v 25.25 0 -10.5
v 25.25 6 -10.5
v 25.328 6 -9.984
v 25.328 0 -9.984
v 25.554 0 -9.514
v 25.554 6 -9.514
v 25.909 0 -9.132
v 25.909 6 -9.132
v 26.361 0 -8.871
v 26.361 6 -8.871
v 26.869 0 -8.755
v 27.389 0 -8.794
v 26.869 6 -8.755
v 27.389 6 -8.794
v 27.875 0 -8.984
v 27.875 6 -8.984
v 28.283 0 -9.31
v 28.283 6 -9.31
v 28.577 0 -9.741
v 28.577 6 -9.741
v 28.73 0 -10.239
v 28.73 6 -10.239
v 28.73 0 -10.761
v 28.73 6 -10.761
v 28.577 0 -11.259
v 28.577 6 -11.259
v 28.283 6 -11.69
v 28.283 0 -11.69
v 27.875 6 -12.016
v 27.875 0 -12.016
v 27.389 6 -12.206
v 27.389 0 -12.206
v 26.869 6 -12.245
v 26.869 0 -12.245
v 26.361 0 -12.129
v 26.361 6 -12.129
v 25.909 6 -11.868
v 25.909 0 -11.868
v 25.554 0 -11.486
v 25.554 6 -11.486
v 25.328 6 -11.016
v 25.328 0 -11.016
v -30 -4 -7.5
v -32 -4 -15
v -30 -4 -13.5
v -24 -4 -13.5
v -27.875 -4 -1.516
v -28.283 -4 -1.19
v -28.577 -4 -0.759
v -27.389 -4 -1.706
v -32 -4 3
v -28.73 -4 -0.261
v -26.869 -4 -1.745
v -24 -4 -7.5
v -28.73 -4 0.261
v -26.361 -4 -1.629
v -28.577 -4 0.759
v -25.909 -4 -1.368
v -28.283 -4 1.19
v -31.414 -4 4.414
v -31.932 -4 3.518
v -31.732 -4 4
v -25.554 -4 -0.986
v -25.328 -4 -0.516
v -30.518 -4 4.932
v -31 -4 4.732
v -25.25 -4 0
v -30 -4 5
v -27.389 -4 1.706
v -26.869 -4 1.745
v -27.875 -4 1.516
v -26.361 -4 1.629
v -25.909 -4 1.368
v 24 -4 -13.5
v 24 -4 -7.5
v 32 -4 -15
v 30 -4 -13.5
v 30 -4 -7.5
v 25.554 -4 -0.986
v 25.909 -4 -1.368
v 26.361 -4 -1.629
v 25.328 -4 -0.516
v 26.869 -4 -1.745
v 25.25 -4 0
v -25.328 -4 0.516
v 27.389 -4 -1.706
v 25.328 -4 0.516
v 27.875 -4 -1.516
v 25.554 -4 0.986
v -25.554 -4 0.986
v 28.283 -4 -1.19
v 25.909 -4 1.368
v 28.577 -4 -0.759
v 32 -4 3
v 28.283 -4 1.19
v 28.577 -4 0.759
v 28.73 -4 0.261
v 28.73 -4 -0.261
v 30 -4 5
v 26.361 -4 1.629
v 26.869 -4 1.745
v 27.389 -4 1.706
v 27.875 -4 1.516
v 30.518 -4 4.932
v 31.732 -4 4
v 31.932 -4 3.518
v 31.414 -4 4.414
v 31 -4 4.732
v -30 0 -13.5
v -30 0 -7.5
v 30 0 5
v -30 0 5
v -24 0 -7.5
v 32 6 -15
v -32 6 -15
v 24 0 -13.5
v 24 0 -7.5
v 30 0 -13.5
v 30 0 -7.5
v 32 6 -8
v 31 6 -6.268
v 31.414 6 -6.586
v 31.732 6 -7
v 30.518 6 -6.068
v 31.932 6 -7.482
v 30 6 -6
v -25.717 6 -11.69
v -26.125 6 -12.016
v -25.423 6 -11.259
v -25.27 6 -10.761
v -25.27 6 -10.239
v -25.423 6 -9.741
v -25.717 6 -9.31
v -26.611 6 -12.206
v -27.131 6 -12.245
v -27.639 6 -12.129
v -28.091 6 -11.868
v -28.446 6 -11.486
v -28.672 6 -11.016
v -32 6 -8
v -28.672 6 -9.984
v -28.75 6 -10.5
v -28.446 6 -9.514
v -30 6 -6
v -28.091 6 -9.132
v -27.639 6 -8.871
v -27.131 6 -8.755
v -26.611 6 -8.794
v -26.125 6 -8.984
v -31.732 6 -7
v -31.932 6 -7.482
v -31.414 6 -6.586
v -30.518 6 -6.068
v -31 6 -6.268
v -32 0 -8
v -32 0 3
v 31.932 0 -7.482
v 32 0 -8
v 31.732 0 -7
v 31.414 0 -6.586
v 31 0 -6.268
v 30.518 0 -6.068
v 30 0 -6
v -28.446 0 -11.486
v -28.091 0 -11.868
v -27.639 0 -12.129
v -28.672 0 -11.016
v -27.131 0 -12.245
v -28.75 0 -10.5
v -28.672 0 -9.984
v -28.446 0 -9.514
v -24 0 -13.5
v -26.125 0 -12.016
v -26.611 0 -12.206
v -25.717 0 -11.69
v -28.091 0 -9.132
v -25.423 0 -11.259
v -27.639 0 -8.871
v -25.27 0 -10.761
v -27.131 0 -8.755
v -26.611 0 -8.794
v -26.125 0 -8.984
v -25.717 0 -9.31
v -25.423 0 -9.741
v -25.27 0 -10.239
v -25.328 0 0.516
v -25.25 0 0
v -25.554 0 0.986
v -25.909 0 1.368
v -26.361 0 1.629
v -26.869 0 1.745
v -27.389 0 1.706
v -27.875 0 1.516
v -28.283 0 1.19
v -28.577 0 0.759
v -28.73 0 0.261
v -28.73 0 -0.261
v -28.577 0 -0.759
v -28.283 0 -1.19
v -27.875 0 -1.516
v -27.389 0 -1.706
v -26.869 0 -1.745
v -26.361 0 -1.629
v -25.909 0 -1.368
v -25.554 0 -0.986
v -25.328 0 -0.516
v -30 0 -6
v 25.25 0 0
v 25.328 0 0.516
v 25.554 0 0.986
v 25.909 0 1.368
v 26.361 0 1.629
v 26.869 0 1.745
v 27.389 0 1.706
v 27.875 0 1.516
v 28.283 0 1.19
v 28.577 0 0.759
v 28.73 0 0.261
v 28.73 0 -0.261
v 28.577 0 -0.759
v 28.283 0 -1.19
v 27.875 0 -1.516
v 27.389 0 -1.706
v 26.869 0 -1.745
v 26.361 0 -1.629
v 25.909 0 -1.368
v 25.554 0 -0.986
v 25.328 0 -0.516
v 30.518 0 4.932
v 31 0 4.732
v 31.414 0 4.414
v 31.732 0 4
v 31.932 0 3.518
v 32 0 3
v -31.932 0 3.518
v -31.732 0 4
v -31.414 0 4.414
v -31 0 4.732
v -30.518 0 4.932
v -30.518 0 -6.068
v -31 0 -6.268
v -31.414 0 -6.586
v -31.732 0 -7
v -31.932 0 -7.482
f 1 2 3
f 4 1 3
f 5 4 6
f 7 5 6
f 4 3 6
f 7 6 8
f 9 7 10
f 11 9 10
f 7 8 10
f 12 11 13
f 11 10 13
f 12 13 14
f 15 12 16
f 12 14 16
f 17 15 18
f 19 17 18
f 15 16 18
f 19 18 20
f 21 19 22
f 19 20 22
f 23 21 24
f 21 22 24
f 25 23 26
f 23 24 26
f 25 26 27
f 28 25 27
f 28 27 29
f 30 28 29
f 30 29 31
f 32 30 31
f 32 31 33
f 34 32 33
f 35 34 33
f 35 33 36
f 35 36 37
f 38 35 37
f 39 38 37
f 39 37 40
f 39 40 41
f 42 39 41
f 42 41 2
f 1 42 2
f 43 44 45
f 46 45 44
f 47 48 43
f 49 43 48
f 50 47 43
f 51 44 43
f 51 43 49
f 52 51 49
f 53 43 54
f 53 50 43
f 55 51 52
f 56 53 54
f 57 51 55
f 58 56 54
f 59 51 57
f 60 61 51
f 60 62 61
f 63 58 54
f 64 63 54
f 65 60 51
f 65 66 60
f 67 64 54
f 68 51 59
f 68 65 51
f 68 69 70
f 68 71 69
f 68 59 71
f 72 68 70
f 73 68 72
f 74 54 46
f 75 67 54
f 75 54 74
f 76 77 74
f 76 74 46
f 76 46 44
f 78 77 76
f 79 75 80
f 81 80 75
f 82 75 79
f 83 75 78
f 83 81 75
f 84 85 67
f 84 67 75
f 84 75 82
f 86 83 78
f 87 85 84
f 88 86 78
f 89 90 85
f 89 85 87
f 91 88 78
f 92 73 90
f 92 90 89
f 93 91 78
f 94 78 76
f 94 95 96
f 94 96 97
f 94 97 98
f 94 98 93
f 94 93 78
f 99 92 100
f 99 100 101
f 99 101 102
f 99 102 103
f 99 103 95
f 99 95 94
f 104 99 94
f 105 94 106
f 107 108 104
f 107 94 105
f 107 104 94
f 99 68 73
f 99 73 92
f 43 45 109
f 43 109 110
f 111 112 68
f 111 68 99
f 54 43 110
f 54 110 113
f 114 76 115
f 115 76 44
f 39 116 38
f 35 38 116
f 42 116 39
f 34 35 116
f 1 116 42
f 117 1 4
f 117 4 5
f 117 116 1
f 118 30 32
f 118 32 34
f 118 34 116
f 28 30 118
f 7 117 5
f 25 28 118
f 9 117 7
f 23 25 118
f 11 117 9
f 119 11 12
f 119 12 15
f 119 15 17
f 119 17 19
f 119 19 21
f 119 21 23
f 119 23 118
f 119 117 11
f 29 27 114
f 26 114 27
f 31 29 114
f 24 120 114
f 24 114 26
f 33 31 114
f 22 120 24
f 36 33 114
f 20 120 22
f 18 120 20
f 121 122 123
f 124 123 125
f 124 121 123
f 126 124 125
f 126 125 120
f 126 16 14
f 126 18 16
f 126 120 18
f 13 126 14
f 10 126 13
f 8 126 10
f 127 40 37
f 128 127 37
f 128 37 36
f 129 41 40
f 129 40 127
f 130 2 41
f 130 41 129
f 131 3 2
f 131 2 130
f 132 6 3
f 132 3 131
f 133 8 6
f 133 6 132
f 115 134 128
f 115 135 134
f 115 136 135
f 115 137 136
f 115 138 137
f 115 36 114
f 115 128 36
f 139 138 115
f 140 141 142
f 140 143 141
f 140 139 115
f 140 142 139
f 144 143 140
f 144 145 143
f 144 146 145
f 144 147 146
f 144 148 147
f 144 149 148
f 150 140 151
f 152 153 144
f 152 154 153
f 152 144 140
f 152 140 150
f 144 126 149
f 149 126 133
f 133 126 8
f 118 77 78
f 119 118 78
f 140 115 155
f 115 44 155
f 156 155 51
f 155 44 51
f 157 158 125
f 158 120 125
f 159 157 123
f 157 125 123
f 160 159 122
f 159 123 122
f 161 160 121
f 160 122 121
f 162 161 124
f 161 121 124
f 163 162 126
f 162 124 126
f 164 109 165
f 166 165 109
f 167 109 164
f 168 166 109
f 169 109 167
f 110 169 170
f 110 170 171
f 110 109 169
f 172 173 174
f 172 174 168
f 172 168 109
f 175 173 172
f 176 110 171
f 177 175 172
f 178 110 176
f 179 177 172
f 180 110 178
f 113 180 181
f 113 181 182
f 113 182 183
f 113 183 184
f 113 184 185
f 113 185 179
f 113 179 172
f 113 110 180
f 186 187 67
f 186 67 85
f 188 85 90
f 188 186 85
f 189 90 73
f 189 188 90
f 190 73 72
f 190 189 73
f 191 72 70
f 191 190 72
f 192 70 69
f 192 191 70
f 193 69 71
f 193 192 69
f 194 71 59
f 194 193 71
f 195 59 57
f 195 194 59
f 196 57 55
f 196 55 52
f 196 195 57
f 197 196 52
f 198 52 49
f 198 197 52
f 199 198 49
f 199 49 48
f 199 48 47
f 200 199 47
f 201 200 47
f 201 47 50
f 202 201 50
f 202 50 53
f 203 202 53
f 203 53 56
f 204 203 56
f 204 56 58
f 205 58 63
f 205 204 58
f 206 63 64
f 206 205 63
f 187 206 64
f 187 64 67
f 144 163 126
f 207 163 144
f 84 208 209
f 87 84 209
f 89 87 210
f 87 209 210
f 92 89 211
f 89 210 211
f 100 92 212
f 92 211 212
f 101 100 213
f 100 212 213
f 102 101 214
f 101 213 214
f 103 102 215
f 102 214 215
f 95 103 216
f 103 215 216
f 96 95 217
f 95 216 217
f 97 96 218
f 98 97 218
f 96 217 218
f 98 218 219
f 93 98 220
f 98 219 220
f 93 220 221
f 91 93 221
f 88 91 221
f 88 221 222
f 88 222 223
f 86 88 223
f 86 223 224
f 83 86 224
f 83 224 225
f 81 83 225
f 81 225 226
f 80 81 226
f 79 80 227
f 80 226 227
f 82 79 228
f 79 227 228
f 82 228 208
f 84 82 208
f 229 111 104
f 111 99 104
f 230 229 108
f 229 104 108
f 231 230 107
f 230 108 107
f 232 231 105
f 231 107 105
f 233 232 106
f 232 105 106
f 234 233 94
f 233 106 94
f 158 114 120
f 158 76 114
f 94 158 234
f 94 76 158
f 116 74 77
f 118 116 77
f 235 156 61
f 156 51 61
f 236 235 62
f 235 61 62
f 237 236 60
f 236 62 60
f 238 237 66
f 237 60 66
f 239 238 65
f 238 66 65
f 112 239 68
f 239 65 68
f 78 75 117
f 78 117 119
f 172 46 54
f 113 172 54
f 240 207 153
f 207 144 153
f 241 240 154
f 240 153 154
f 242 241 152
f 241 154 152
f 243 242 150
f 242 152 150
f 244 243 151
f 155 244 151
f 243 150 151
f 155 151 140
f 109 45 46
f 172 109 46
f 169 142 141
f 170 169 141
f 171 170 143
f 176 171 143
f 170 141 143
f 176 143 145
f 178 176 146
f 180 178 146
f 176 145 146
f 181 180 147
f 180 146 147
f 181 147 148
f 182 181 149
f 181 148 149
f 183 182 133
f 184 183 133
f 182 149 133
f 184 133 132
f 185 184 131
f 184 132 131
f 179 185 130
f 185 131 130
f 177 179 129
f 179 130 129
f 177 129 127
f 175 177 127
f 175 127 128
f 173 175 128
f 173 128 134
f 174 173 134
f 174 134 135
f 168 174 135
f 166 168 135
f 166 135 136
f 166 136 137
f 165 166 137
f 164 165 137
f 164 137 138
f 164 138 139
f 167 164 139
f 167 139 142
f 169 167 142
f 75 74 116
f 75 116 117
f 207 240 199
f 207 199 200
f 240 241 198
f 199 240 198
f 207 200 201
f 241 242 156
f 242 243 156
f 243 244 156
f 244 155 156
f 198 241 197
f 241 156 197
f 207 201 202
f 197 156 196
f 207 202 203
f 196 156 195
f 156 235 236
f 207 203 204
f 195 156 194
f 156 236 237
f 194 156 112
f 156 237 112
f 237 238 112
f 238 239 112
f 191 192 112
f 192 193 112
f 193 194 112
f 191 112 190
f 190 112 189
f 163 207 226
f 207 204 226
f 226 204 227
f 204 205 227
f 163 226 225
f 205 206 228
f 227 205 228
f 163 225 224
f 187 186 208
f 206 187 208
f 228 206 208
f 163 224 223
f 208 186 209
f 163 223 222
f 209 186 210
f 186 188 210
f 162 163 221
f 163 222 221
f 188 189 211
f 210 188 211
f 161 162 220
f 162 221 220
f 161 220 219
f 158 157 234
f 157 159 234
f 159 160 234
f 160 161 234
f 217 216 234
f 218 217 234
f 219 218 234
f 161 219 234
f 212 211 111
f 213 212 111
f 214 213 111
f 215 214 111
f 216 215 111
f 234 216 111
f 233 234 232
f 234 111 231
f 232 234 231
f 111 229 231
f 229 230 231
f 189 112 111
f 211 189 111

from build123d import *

# Parameters (mm, degrees)
F0_W     = 64
F0_H     = 10
F0_R     = 1.75
F1_DEPTH = 4
F2_R     = 2
F3_DEPTH = 10
F4_W     = 64
F4_H     = 9
F5_DEPTH = 6
F6_R     = 1.75
F7_DEPTH = 25
F8_W     = 6
F8_H     = 6
F9_DEPTH = 4
F10_R    = 2


with BuildPart() as f1:
    # F0 (on Front) → F1 (new body)
    with BuildSketch(Plane.XZ):
        Rectangle(F0_W, F0_H)
        with Locations((-27, 0)):
            Circle(F0_R, mode=Mode.SUBTRACT)
        with BuildLine():
            ThreePointArc((28.75, 0), (27, -1.75), (25.25, 0))
            ThreePointArc((25.25, 0), (27, 1.75), (28.75, 0))
        make_face(mode=Mode.SUBTRACT)
    extrude(amount=F1_DEPTH)

    # F2
    f2_edges = [f1.edges().sort_by_distance(p)[0] for p in [
        (-32, -2, 5),
        (32, -2, 5),
    ]]
    fillet(f2_edges, radius=F2_R)

    # F3 (add): a face of the model
    f3_faces = [f1.faces().sort_by_distance(p)[0] for p in [
        (0, -2, -5),
    ]]
    extrude(f3_faces, amount=F3_DEPTH)

    # F4 (on face) → F5 (join)
    with BuildSketch(Plane(origin=(0, 0, 0), x_dir=(-1, 0, 0), z_dir=(0, 1, 0))):
        with Locations((0, -10.5)):
            Rectangle(F4_W, F4_H)
    extrude(amount=F5_DEPTH)

    # F6 (on face) → F7 (cut)
    with BuildSketch(Plane(origin=(0, 6, 0), x_dir=(-1, 0, 0), z_dir=(0, 1, 0))):
        with BuildLine():
            ThreePointArc((-28.75, -10.5), (-27, -12.25), (-25.25, -10.5))
            ThreePointArc((-25.25, -10.5), (-27, -8.75), (-28.75, -10.5))
        make_face()
        with Locations((27, -10.5)):
            Circle(F6_R)
    extrude(amount=-F7_DEPTH, mode=Mode.SUBTRACT)

    # F8 (on face) → F9 (cut)
    with BuildSketch(Plane.XZ.offset(4)):
        with Locations((-27, -10.5)):
            Rectangle(F8_W, F8_H)
        with Locations((27, -10.5)):
            Rectangle(F8_W, F8_H)
    extrude(amount=-F9_DEPTH, mode=Mode.SUBTRACT)

    # F10
    f10_edges = [f1.edges().sort_by_distance(p)[0] for p in [
        (32, 3, -6),
        (-32, 3, -6),
    ]]
    fillet(f10_edges, radius=F10_R)


solid = f1.part
